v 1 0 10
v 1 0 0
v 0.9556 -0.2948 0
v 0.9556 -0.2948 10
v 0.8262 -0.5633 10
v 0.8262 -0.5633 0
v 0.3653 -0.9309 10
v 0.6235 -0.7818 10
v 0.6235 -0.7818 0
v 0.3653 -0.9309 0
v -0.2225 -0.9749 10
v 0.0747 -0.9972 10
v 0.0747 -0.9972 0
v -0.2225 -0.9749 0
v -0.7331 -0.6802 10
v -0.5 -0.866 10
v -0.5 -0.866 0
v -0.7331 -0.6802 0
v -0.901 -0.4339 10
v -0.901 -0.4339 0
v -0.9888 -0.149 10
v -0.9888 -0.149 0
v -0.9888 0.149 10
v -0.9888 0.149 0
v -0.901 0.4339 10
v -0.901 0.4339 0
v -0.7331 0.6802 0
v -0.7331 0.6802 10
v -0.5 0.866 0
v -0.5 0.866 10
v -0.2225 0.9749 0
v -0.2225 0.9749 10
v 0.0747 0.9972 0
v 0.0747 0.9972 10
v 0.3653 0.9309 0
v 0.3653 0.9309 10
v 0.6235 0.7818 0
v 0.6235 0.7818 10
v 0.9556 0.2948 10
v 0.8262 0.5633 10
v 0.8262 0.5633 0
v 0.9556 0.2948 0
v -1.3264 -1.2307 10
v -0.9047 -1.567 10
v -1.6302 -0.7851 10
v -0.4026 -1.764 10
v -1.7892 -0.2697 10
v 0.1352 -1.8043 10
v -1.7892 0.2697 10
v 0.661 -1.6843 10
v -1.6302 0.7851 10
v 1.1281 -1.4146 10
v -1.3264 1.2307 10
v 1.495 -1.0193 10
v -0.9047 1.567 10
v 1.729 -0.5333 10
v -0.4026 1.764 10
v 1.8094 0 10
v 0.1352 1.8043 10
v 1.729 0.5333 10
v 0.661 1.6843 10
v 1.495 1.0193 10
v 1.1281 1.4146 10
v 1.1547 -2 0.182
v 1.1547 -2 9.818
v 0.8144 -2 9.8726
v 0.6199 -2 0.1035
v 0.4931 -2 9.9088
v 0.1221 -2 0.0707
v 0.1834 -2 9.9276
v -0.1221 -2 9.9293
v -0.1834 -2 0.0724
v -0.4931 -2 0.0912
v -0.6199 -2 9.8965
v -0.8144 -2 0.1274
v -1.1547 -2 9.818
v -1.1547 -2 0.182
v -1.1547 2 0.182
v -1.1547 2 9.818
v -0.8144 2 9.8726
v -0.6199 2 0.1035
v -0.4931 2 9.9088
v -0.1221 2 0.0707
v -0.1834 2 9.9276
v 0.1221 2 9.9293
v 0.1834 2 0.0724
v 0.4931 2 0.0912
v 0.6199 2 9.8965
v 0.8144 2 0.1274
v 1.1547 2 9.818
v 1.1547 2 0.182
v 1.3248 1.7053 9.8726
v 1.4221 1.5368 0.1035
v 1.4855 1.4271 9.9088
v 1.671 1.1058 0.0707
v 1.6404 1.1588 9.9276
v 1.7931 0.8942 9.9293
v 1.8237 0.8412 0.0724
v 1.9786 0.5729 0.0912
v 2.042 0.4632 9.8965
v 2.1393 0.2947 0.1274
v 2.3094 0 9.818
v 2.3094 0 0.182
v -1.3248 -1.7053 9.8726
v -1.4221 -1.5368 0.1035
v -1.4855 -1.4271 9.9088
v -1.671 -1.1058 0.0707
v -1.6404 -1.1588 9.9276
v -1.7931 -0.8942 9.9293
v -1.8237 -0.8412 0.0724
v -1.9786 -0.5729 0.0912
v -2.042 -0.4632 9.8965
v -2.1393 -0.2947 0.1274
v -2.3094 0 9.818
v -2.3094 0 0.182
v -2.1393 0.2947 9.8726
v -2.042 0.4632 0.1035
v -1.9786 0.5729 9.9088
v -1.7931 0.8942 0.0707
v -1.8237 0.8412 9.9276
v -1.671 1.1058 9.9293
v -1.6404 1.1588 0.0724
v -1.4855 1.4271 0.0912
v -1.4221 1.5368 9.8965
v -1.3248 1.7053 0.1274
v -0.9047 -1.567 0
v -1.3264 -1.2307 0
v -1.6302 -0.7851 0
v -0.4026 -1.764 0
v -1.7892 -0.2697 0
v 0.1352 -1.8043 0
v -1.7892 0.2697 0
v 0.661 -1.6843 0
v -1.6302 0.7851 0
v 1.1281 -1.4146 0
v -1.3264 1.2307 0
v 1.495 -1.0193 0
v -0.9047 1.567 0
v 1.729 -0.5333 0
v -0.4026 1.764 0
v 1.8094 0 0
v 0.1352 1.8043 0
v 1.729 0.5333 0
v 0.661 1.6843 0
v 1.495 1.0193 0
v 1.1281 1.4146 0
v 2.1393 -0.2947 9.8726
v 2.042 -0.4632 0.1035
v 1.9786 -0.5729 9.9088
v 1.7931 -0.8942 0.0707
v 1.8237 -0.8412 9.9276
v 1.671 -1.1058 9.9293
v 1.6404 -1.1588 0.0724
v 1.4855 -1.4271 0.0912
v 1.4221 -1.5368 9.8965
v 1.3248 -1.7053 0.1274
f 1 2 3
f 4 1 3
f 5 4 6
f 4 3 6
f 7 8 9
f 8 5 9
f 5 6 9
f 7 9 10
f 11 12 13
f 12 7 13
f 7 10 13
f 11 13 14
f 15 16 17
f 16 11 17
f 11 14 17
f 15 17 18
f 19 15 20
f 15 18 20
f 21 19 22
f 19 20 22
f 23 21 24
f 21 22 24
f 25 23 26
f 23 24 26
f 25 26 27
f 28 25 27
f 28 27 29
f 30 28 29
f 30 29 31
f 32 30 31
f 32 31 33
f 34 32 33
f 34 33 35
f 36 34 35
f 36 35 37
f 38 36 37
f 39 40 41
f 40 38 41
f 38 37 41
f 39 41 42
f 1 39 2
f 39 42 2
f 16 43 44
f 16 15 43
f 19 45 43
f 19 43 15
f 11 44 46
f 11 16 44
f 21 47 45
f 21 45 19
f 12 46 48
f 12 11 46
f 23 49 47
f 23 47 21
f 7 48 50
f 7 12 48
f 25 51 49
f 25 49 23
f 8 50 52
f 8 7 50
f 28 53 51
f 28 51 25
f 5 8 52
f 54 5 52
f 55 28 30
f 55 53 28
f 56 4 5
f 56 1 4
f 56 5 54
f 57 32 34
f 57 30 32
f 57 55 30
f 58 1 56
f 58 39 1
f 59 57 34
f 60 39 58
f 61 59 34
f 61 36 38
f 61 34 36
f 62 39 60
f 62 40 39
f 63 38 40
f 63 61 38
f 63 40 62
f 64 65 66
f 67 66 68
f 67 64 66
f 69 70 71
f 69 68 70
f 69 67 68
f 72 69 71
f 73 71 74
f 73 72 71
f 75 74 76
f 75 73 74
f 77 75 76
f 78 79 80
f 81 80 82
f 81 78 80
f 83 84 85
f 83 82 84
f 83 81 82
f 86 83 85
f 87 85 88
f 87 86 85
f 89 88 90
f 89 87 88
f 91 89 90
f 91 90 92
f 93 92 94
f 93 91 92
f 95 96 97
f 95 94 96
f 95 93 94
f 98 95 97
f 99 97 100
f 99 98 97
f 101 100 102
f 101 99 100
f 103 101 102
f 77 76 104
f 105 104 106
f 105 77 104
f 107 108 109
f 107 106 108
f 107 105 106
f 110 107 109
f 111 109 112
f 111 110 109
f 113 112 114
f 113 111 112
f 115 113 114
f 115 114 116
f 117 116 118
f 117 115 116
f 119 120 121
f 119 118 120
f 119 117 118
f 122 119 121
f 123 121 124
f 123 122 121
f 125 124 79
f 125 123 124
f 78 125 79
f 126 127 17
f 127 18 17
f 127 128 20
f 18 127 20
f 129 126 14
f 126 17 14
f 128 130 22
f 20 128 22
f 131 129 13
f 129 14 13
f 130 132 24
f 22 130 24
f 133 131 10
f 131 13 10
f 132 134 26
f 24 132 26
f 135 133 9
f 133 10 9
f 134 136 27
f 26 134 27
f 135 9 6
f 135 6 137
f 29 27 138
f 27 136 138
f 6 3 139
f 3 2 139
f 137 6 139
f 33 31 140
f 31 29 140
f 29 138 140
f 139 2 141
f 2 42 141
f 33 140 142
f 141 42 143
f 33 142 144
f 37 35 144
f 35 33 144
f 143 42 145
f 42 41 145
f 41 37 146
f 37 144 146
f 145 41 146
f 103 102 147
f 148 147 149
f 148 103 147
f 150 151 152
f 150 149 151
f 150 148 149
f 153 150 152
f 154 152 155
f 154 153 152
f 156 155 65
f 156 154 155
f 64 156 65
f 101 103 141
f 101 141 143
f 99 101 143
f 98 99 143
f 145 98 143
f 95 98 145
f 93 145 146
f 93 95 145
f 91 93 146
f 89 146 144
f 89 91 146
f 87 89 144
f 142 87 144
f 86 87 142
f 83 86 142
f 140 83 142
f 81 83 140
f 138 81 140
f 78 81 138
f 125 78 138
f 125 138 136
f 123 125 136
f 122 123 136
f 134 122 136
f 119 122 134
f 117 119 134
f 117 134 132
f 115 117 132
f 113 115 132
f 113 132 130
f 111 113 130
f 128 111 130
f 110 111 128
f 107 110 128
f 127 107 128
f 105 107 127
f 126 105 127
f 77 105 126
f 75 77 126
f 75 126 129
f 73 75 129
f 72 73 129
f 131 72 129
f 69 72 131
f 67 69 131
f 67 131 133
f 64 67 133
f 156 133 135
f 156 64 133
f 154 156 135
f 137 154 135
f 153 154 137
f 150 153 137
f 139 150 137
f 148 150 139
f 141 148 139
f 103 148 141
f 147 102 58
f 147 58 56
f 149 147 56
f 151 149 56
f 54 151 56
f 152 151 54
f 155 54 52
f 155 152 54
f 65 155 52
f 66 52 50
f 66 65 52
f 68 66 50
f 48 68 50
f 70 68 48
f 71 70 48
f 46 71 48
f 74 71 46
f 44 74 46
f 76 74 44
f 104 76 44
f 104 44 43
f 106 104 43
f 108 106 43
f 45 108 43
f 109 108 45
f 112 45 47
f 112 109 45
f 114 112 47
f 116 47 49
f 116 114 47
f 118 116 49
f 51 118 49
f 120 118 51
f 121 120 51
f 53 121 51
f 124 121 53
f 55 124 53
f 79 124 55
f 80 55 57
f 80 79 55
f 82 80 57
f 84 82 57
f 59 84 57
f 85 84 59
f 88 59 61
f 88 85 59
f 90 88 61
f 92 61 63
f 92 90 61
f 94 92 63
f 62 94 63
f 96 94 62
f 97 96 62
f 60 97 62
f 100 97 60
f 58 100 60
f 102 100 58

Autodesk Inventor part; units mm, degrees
ref_plane "YZ Plane" through (0, 0, 0) normal (1, 0, 0) x (0, 1, 0)
ref_plane "XZ Plane" through (0, 0, 0) normal (0, 1, 0) x (-1, 0, 0)
ref_plane "XY Plane" through (0, 0, 0) normal (0, 0, 1) x (1, 0, 0)
sketch "Skizze1" plane through (0, 0, 0) normal (0, 0, 1) x (1, 0, 0)
  line L0 (-3.2332, 0) -> (3.2332, 0) construction
  line L1 (0, -2.8) -> (0, 2.8) construction
  circle A0 centre (0, 0) radius 2 construction
  line L2 (1.1547, 2) -> (2.3094, 0)
  line L3 (2.3094, 0) -> (1.1547, -2)
  line L4 (1.1547, -2) -> (-1.1547, -2)
  line L5 (-1.1547, -2) -> (-2.3094, 0)
  line L6 (-2.3094, 0) -> (-1.1547, 2)
  line L7 (-1.1547, 2) -> (1.1547, 2)
  circle A1 centre (0, 0) radius 1
  point P0 (0, 2)
  dimension "d0" = 4
  dimension "d1" = 2
extrude "Extrusion1" add sketch "Skizze1" along normal blind 10
sketch "Skizze2" plane through (0, 0, 0) normal (0, 1, 0) x (-1, 0, 0)
  line L0 (1.1547, 10) -> (-1.1547, 10) projected
  line L1 (-1.1547, 10) -> (-2.3094, 10) projected
  line L2 (2.3094, 10) -> (1.1547, 10) projected
  line L3 (2.3094, 0) -> (1.1547, 0) projected
  line L4 (1.1547, 0) -> (-1.1547, 0) projected
  line L5 (-1.1547, 0) -> (-2.3094, 0) projected
  line L6 (-1.8094, 10) -> (-3.6188, 10)
  line L7 (-3.6188, 10) -> (-3.6188, 9.3414)
  line L8 (-3.6188, 9.3414) -> (-1.8094, 10)
  line L9 (-1.8094, 0) -> (-3.6188, 0.6586)
  line L10 (-3.6188, 0.6586) -> (-3.6188, 0)
  line L11 (-3.6188, 0) -> (-1.8094, 0)
  line L12 (0, -2) -> (0, 12) projected
  point P0 (0, 0)
  dimension "d4" = 20
  dimension "d5" = 0.5
revolve "Umdrehung1" cut sketch "Skizze2" angle 360 about axis through (0, 0, -10) along (0, 0, 1)
properties part number "Hex Spacer 10mm"
